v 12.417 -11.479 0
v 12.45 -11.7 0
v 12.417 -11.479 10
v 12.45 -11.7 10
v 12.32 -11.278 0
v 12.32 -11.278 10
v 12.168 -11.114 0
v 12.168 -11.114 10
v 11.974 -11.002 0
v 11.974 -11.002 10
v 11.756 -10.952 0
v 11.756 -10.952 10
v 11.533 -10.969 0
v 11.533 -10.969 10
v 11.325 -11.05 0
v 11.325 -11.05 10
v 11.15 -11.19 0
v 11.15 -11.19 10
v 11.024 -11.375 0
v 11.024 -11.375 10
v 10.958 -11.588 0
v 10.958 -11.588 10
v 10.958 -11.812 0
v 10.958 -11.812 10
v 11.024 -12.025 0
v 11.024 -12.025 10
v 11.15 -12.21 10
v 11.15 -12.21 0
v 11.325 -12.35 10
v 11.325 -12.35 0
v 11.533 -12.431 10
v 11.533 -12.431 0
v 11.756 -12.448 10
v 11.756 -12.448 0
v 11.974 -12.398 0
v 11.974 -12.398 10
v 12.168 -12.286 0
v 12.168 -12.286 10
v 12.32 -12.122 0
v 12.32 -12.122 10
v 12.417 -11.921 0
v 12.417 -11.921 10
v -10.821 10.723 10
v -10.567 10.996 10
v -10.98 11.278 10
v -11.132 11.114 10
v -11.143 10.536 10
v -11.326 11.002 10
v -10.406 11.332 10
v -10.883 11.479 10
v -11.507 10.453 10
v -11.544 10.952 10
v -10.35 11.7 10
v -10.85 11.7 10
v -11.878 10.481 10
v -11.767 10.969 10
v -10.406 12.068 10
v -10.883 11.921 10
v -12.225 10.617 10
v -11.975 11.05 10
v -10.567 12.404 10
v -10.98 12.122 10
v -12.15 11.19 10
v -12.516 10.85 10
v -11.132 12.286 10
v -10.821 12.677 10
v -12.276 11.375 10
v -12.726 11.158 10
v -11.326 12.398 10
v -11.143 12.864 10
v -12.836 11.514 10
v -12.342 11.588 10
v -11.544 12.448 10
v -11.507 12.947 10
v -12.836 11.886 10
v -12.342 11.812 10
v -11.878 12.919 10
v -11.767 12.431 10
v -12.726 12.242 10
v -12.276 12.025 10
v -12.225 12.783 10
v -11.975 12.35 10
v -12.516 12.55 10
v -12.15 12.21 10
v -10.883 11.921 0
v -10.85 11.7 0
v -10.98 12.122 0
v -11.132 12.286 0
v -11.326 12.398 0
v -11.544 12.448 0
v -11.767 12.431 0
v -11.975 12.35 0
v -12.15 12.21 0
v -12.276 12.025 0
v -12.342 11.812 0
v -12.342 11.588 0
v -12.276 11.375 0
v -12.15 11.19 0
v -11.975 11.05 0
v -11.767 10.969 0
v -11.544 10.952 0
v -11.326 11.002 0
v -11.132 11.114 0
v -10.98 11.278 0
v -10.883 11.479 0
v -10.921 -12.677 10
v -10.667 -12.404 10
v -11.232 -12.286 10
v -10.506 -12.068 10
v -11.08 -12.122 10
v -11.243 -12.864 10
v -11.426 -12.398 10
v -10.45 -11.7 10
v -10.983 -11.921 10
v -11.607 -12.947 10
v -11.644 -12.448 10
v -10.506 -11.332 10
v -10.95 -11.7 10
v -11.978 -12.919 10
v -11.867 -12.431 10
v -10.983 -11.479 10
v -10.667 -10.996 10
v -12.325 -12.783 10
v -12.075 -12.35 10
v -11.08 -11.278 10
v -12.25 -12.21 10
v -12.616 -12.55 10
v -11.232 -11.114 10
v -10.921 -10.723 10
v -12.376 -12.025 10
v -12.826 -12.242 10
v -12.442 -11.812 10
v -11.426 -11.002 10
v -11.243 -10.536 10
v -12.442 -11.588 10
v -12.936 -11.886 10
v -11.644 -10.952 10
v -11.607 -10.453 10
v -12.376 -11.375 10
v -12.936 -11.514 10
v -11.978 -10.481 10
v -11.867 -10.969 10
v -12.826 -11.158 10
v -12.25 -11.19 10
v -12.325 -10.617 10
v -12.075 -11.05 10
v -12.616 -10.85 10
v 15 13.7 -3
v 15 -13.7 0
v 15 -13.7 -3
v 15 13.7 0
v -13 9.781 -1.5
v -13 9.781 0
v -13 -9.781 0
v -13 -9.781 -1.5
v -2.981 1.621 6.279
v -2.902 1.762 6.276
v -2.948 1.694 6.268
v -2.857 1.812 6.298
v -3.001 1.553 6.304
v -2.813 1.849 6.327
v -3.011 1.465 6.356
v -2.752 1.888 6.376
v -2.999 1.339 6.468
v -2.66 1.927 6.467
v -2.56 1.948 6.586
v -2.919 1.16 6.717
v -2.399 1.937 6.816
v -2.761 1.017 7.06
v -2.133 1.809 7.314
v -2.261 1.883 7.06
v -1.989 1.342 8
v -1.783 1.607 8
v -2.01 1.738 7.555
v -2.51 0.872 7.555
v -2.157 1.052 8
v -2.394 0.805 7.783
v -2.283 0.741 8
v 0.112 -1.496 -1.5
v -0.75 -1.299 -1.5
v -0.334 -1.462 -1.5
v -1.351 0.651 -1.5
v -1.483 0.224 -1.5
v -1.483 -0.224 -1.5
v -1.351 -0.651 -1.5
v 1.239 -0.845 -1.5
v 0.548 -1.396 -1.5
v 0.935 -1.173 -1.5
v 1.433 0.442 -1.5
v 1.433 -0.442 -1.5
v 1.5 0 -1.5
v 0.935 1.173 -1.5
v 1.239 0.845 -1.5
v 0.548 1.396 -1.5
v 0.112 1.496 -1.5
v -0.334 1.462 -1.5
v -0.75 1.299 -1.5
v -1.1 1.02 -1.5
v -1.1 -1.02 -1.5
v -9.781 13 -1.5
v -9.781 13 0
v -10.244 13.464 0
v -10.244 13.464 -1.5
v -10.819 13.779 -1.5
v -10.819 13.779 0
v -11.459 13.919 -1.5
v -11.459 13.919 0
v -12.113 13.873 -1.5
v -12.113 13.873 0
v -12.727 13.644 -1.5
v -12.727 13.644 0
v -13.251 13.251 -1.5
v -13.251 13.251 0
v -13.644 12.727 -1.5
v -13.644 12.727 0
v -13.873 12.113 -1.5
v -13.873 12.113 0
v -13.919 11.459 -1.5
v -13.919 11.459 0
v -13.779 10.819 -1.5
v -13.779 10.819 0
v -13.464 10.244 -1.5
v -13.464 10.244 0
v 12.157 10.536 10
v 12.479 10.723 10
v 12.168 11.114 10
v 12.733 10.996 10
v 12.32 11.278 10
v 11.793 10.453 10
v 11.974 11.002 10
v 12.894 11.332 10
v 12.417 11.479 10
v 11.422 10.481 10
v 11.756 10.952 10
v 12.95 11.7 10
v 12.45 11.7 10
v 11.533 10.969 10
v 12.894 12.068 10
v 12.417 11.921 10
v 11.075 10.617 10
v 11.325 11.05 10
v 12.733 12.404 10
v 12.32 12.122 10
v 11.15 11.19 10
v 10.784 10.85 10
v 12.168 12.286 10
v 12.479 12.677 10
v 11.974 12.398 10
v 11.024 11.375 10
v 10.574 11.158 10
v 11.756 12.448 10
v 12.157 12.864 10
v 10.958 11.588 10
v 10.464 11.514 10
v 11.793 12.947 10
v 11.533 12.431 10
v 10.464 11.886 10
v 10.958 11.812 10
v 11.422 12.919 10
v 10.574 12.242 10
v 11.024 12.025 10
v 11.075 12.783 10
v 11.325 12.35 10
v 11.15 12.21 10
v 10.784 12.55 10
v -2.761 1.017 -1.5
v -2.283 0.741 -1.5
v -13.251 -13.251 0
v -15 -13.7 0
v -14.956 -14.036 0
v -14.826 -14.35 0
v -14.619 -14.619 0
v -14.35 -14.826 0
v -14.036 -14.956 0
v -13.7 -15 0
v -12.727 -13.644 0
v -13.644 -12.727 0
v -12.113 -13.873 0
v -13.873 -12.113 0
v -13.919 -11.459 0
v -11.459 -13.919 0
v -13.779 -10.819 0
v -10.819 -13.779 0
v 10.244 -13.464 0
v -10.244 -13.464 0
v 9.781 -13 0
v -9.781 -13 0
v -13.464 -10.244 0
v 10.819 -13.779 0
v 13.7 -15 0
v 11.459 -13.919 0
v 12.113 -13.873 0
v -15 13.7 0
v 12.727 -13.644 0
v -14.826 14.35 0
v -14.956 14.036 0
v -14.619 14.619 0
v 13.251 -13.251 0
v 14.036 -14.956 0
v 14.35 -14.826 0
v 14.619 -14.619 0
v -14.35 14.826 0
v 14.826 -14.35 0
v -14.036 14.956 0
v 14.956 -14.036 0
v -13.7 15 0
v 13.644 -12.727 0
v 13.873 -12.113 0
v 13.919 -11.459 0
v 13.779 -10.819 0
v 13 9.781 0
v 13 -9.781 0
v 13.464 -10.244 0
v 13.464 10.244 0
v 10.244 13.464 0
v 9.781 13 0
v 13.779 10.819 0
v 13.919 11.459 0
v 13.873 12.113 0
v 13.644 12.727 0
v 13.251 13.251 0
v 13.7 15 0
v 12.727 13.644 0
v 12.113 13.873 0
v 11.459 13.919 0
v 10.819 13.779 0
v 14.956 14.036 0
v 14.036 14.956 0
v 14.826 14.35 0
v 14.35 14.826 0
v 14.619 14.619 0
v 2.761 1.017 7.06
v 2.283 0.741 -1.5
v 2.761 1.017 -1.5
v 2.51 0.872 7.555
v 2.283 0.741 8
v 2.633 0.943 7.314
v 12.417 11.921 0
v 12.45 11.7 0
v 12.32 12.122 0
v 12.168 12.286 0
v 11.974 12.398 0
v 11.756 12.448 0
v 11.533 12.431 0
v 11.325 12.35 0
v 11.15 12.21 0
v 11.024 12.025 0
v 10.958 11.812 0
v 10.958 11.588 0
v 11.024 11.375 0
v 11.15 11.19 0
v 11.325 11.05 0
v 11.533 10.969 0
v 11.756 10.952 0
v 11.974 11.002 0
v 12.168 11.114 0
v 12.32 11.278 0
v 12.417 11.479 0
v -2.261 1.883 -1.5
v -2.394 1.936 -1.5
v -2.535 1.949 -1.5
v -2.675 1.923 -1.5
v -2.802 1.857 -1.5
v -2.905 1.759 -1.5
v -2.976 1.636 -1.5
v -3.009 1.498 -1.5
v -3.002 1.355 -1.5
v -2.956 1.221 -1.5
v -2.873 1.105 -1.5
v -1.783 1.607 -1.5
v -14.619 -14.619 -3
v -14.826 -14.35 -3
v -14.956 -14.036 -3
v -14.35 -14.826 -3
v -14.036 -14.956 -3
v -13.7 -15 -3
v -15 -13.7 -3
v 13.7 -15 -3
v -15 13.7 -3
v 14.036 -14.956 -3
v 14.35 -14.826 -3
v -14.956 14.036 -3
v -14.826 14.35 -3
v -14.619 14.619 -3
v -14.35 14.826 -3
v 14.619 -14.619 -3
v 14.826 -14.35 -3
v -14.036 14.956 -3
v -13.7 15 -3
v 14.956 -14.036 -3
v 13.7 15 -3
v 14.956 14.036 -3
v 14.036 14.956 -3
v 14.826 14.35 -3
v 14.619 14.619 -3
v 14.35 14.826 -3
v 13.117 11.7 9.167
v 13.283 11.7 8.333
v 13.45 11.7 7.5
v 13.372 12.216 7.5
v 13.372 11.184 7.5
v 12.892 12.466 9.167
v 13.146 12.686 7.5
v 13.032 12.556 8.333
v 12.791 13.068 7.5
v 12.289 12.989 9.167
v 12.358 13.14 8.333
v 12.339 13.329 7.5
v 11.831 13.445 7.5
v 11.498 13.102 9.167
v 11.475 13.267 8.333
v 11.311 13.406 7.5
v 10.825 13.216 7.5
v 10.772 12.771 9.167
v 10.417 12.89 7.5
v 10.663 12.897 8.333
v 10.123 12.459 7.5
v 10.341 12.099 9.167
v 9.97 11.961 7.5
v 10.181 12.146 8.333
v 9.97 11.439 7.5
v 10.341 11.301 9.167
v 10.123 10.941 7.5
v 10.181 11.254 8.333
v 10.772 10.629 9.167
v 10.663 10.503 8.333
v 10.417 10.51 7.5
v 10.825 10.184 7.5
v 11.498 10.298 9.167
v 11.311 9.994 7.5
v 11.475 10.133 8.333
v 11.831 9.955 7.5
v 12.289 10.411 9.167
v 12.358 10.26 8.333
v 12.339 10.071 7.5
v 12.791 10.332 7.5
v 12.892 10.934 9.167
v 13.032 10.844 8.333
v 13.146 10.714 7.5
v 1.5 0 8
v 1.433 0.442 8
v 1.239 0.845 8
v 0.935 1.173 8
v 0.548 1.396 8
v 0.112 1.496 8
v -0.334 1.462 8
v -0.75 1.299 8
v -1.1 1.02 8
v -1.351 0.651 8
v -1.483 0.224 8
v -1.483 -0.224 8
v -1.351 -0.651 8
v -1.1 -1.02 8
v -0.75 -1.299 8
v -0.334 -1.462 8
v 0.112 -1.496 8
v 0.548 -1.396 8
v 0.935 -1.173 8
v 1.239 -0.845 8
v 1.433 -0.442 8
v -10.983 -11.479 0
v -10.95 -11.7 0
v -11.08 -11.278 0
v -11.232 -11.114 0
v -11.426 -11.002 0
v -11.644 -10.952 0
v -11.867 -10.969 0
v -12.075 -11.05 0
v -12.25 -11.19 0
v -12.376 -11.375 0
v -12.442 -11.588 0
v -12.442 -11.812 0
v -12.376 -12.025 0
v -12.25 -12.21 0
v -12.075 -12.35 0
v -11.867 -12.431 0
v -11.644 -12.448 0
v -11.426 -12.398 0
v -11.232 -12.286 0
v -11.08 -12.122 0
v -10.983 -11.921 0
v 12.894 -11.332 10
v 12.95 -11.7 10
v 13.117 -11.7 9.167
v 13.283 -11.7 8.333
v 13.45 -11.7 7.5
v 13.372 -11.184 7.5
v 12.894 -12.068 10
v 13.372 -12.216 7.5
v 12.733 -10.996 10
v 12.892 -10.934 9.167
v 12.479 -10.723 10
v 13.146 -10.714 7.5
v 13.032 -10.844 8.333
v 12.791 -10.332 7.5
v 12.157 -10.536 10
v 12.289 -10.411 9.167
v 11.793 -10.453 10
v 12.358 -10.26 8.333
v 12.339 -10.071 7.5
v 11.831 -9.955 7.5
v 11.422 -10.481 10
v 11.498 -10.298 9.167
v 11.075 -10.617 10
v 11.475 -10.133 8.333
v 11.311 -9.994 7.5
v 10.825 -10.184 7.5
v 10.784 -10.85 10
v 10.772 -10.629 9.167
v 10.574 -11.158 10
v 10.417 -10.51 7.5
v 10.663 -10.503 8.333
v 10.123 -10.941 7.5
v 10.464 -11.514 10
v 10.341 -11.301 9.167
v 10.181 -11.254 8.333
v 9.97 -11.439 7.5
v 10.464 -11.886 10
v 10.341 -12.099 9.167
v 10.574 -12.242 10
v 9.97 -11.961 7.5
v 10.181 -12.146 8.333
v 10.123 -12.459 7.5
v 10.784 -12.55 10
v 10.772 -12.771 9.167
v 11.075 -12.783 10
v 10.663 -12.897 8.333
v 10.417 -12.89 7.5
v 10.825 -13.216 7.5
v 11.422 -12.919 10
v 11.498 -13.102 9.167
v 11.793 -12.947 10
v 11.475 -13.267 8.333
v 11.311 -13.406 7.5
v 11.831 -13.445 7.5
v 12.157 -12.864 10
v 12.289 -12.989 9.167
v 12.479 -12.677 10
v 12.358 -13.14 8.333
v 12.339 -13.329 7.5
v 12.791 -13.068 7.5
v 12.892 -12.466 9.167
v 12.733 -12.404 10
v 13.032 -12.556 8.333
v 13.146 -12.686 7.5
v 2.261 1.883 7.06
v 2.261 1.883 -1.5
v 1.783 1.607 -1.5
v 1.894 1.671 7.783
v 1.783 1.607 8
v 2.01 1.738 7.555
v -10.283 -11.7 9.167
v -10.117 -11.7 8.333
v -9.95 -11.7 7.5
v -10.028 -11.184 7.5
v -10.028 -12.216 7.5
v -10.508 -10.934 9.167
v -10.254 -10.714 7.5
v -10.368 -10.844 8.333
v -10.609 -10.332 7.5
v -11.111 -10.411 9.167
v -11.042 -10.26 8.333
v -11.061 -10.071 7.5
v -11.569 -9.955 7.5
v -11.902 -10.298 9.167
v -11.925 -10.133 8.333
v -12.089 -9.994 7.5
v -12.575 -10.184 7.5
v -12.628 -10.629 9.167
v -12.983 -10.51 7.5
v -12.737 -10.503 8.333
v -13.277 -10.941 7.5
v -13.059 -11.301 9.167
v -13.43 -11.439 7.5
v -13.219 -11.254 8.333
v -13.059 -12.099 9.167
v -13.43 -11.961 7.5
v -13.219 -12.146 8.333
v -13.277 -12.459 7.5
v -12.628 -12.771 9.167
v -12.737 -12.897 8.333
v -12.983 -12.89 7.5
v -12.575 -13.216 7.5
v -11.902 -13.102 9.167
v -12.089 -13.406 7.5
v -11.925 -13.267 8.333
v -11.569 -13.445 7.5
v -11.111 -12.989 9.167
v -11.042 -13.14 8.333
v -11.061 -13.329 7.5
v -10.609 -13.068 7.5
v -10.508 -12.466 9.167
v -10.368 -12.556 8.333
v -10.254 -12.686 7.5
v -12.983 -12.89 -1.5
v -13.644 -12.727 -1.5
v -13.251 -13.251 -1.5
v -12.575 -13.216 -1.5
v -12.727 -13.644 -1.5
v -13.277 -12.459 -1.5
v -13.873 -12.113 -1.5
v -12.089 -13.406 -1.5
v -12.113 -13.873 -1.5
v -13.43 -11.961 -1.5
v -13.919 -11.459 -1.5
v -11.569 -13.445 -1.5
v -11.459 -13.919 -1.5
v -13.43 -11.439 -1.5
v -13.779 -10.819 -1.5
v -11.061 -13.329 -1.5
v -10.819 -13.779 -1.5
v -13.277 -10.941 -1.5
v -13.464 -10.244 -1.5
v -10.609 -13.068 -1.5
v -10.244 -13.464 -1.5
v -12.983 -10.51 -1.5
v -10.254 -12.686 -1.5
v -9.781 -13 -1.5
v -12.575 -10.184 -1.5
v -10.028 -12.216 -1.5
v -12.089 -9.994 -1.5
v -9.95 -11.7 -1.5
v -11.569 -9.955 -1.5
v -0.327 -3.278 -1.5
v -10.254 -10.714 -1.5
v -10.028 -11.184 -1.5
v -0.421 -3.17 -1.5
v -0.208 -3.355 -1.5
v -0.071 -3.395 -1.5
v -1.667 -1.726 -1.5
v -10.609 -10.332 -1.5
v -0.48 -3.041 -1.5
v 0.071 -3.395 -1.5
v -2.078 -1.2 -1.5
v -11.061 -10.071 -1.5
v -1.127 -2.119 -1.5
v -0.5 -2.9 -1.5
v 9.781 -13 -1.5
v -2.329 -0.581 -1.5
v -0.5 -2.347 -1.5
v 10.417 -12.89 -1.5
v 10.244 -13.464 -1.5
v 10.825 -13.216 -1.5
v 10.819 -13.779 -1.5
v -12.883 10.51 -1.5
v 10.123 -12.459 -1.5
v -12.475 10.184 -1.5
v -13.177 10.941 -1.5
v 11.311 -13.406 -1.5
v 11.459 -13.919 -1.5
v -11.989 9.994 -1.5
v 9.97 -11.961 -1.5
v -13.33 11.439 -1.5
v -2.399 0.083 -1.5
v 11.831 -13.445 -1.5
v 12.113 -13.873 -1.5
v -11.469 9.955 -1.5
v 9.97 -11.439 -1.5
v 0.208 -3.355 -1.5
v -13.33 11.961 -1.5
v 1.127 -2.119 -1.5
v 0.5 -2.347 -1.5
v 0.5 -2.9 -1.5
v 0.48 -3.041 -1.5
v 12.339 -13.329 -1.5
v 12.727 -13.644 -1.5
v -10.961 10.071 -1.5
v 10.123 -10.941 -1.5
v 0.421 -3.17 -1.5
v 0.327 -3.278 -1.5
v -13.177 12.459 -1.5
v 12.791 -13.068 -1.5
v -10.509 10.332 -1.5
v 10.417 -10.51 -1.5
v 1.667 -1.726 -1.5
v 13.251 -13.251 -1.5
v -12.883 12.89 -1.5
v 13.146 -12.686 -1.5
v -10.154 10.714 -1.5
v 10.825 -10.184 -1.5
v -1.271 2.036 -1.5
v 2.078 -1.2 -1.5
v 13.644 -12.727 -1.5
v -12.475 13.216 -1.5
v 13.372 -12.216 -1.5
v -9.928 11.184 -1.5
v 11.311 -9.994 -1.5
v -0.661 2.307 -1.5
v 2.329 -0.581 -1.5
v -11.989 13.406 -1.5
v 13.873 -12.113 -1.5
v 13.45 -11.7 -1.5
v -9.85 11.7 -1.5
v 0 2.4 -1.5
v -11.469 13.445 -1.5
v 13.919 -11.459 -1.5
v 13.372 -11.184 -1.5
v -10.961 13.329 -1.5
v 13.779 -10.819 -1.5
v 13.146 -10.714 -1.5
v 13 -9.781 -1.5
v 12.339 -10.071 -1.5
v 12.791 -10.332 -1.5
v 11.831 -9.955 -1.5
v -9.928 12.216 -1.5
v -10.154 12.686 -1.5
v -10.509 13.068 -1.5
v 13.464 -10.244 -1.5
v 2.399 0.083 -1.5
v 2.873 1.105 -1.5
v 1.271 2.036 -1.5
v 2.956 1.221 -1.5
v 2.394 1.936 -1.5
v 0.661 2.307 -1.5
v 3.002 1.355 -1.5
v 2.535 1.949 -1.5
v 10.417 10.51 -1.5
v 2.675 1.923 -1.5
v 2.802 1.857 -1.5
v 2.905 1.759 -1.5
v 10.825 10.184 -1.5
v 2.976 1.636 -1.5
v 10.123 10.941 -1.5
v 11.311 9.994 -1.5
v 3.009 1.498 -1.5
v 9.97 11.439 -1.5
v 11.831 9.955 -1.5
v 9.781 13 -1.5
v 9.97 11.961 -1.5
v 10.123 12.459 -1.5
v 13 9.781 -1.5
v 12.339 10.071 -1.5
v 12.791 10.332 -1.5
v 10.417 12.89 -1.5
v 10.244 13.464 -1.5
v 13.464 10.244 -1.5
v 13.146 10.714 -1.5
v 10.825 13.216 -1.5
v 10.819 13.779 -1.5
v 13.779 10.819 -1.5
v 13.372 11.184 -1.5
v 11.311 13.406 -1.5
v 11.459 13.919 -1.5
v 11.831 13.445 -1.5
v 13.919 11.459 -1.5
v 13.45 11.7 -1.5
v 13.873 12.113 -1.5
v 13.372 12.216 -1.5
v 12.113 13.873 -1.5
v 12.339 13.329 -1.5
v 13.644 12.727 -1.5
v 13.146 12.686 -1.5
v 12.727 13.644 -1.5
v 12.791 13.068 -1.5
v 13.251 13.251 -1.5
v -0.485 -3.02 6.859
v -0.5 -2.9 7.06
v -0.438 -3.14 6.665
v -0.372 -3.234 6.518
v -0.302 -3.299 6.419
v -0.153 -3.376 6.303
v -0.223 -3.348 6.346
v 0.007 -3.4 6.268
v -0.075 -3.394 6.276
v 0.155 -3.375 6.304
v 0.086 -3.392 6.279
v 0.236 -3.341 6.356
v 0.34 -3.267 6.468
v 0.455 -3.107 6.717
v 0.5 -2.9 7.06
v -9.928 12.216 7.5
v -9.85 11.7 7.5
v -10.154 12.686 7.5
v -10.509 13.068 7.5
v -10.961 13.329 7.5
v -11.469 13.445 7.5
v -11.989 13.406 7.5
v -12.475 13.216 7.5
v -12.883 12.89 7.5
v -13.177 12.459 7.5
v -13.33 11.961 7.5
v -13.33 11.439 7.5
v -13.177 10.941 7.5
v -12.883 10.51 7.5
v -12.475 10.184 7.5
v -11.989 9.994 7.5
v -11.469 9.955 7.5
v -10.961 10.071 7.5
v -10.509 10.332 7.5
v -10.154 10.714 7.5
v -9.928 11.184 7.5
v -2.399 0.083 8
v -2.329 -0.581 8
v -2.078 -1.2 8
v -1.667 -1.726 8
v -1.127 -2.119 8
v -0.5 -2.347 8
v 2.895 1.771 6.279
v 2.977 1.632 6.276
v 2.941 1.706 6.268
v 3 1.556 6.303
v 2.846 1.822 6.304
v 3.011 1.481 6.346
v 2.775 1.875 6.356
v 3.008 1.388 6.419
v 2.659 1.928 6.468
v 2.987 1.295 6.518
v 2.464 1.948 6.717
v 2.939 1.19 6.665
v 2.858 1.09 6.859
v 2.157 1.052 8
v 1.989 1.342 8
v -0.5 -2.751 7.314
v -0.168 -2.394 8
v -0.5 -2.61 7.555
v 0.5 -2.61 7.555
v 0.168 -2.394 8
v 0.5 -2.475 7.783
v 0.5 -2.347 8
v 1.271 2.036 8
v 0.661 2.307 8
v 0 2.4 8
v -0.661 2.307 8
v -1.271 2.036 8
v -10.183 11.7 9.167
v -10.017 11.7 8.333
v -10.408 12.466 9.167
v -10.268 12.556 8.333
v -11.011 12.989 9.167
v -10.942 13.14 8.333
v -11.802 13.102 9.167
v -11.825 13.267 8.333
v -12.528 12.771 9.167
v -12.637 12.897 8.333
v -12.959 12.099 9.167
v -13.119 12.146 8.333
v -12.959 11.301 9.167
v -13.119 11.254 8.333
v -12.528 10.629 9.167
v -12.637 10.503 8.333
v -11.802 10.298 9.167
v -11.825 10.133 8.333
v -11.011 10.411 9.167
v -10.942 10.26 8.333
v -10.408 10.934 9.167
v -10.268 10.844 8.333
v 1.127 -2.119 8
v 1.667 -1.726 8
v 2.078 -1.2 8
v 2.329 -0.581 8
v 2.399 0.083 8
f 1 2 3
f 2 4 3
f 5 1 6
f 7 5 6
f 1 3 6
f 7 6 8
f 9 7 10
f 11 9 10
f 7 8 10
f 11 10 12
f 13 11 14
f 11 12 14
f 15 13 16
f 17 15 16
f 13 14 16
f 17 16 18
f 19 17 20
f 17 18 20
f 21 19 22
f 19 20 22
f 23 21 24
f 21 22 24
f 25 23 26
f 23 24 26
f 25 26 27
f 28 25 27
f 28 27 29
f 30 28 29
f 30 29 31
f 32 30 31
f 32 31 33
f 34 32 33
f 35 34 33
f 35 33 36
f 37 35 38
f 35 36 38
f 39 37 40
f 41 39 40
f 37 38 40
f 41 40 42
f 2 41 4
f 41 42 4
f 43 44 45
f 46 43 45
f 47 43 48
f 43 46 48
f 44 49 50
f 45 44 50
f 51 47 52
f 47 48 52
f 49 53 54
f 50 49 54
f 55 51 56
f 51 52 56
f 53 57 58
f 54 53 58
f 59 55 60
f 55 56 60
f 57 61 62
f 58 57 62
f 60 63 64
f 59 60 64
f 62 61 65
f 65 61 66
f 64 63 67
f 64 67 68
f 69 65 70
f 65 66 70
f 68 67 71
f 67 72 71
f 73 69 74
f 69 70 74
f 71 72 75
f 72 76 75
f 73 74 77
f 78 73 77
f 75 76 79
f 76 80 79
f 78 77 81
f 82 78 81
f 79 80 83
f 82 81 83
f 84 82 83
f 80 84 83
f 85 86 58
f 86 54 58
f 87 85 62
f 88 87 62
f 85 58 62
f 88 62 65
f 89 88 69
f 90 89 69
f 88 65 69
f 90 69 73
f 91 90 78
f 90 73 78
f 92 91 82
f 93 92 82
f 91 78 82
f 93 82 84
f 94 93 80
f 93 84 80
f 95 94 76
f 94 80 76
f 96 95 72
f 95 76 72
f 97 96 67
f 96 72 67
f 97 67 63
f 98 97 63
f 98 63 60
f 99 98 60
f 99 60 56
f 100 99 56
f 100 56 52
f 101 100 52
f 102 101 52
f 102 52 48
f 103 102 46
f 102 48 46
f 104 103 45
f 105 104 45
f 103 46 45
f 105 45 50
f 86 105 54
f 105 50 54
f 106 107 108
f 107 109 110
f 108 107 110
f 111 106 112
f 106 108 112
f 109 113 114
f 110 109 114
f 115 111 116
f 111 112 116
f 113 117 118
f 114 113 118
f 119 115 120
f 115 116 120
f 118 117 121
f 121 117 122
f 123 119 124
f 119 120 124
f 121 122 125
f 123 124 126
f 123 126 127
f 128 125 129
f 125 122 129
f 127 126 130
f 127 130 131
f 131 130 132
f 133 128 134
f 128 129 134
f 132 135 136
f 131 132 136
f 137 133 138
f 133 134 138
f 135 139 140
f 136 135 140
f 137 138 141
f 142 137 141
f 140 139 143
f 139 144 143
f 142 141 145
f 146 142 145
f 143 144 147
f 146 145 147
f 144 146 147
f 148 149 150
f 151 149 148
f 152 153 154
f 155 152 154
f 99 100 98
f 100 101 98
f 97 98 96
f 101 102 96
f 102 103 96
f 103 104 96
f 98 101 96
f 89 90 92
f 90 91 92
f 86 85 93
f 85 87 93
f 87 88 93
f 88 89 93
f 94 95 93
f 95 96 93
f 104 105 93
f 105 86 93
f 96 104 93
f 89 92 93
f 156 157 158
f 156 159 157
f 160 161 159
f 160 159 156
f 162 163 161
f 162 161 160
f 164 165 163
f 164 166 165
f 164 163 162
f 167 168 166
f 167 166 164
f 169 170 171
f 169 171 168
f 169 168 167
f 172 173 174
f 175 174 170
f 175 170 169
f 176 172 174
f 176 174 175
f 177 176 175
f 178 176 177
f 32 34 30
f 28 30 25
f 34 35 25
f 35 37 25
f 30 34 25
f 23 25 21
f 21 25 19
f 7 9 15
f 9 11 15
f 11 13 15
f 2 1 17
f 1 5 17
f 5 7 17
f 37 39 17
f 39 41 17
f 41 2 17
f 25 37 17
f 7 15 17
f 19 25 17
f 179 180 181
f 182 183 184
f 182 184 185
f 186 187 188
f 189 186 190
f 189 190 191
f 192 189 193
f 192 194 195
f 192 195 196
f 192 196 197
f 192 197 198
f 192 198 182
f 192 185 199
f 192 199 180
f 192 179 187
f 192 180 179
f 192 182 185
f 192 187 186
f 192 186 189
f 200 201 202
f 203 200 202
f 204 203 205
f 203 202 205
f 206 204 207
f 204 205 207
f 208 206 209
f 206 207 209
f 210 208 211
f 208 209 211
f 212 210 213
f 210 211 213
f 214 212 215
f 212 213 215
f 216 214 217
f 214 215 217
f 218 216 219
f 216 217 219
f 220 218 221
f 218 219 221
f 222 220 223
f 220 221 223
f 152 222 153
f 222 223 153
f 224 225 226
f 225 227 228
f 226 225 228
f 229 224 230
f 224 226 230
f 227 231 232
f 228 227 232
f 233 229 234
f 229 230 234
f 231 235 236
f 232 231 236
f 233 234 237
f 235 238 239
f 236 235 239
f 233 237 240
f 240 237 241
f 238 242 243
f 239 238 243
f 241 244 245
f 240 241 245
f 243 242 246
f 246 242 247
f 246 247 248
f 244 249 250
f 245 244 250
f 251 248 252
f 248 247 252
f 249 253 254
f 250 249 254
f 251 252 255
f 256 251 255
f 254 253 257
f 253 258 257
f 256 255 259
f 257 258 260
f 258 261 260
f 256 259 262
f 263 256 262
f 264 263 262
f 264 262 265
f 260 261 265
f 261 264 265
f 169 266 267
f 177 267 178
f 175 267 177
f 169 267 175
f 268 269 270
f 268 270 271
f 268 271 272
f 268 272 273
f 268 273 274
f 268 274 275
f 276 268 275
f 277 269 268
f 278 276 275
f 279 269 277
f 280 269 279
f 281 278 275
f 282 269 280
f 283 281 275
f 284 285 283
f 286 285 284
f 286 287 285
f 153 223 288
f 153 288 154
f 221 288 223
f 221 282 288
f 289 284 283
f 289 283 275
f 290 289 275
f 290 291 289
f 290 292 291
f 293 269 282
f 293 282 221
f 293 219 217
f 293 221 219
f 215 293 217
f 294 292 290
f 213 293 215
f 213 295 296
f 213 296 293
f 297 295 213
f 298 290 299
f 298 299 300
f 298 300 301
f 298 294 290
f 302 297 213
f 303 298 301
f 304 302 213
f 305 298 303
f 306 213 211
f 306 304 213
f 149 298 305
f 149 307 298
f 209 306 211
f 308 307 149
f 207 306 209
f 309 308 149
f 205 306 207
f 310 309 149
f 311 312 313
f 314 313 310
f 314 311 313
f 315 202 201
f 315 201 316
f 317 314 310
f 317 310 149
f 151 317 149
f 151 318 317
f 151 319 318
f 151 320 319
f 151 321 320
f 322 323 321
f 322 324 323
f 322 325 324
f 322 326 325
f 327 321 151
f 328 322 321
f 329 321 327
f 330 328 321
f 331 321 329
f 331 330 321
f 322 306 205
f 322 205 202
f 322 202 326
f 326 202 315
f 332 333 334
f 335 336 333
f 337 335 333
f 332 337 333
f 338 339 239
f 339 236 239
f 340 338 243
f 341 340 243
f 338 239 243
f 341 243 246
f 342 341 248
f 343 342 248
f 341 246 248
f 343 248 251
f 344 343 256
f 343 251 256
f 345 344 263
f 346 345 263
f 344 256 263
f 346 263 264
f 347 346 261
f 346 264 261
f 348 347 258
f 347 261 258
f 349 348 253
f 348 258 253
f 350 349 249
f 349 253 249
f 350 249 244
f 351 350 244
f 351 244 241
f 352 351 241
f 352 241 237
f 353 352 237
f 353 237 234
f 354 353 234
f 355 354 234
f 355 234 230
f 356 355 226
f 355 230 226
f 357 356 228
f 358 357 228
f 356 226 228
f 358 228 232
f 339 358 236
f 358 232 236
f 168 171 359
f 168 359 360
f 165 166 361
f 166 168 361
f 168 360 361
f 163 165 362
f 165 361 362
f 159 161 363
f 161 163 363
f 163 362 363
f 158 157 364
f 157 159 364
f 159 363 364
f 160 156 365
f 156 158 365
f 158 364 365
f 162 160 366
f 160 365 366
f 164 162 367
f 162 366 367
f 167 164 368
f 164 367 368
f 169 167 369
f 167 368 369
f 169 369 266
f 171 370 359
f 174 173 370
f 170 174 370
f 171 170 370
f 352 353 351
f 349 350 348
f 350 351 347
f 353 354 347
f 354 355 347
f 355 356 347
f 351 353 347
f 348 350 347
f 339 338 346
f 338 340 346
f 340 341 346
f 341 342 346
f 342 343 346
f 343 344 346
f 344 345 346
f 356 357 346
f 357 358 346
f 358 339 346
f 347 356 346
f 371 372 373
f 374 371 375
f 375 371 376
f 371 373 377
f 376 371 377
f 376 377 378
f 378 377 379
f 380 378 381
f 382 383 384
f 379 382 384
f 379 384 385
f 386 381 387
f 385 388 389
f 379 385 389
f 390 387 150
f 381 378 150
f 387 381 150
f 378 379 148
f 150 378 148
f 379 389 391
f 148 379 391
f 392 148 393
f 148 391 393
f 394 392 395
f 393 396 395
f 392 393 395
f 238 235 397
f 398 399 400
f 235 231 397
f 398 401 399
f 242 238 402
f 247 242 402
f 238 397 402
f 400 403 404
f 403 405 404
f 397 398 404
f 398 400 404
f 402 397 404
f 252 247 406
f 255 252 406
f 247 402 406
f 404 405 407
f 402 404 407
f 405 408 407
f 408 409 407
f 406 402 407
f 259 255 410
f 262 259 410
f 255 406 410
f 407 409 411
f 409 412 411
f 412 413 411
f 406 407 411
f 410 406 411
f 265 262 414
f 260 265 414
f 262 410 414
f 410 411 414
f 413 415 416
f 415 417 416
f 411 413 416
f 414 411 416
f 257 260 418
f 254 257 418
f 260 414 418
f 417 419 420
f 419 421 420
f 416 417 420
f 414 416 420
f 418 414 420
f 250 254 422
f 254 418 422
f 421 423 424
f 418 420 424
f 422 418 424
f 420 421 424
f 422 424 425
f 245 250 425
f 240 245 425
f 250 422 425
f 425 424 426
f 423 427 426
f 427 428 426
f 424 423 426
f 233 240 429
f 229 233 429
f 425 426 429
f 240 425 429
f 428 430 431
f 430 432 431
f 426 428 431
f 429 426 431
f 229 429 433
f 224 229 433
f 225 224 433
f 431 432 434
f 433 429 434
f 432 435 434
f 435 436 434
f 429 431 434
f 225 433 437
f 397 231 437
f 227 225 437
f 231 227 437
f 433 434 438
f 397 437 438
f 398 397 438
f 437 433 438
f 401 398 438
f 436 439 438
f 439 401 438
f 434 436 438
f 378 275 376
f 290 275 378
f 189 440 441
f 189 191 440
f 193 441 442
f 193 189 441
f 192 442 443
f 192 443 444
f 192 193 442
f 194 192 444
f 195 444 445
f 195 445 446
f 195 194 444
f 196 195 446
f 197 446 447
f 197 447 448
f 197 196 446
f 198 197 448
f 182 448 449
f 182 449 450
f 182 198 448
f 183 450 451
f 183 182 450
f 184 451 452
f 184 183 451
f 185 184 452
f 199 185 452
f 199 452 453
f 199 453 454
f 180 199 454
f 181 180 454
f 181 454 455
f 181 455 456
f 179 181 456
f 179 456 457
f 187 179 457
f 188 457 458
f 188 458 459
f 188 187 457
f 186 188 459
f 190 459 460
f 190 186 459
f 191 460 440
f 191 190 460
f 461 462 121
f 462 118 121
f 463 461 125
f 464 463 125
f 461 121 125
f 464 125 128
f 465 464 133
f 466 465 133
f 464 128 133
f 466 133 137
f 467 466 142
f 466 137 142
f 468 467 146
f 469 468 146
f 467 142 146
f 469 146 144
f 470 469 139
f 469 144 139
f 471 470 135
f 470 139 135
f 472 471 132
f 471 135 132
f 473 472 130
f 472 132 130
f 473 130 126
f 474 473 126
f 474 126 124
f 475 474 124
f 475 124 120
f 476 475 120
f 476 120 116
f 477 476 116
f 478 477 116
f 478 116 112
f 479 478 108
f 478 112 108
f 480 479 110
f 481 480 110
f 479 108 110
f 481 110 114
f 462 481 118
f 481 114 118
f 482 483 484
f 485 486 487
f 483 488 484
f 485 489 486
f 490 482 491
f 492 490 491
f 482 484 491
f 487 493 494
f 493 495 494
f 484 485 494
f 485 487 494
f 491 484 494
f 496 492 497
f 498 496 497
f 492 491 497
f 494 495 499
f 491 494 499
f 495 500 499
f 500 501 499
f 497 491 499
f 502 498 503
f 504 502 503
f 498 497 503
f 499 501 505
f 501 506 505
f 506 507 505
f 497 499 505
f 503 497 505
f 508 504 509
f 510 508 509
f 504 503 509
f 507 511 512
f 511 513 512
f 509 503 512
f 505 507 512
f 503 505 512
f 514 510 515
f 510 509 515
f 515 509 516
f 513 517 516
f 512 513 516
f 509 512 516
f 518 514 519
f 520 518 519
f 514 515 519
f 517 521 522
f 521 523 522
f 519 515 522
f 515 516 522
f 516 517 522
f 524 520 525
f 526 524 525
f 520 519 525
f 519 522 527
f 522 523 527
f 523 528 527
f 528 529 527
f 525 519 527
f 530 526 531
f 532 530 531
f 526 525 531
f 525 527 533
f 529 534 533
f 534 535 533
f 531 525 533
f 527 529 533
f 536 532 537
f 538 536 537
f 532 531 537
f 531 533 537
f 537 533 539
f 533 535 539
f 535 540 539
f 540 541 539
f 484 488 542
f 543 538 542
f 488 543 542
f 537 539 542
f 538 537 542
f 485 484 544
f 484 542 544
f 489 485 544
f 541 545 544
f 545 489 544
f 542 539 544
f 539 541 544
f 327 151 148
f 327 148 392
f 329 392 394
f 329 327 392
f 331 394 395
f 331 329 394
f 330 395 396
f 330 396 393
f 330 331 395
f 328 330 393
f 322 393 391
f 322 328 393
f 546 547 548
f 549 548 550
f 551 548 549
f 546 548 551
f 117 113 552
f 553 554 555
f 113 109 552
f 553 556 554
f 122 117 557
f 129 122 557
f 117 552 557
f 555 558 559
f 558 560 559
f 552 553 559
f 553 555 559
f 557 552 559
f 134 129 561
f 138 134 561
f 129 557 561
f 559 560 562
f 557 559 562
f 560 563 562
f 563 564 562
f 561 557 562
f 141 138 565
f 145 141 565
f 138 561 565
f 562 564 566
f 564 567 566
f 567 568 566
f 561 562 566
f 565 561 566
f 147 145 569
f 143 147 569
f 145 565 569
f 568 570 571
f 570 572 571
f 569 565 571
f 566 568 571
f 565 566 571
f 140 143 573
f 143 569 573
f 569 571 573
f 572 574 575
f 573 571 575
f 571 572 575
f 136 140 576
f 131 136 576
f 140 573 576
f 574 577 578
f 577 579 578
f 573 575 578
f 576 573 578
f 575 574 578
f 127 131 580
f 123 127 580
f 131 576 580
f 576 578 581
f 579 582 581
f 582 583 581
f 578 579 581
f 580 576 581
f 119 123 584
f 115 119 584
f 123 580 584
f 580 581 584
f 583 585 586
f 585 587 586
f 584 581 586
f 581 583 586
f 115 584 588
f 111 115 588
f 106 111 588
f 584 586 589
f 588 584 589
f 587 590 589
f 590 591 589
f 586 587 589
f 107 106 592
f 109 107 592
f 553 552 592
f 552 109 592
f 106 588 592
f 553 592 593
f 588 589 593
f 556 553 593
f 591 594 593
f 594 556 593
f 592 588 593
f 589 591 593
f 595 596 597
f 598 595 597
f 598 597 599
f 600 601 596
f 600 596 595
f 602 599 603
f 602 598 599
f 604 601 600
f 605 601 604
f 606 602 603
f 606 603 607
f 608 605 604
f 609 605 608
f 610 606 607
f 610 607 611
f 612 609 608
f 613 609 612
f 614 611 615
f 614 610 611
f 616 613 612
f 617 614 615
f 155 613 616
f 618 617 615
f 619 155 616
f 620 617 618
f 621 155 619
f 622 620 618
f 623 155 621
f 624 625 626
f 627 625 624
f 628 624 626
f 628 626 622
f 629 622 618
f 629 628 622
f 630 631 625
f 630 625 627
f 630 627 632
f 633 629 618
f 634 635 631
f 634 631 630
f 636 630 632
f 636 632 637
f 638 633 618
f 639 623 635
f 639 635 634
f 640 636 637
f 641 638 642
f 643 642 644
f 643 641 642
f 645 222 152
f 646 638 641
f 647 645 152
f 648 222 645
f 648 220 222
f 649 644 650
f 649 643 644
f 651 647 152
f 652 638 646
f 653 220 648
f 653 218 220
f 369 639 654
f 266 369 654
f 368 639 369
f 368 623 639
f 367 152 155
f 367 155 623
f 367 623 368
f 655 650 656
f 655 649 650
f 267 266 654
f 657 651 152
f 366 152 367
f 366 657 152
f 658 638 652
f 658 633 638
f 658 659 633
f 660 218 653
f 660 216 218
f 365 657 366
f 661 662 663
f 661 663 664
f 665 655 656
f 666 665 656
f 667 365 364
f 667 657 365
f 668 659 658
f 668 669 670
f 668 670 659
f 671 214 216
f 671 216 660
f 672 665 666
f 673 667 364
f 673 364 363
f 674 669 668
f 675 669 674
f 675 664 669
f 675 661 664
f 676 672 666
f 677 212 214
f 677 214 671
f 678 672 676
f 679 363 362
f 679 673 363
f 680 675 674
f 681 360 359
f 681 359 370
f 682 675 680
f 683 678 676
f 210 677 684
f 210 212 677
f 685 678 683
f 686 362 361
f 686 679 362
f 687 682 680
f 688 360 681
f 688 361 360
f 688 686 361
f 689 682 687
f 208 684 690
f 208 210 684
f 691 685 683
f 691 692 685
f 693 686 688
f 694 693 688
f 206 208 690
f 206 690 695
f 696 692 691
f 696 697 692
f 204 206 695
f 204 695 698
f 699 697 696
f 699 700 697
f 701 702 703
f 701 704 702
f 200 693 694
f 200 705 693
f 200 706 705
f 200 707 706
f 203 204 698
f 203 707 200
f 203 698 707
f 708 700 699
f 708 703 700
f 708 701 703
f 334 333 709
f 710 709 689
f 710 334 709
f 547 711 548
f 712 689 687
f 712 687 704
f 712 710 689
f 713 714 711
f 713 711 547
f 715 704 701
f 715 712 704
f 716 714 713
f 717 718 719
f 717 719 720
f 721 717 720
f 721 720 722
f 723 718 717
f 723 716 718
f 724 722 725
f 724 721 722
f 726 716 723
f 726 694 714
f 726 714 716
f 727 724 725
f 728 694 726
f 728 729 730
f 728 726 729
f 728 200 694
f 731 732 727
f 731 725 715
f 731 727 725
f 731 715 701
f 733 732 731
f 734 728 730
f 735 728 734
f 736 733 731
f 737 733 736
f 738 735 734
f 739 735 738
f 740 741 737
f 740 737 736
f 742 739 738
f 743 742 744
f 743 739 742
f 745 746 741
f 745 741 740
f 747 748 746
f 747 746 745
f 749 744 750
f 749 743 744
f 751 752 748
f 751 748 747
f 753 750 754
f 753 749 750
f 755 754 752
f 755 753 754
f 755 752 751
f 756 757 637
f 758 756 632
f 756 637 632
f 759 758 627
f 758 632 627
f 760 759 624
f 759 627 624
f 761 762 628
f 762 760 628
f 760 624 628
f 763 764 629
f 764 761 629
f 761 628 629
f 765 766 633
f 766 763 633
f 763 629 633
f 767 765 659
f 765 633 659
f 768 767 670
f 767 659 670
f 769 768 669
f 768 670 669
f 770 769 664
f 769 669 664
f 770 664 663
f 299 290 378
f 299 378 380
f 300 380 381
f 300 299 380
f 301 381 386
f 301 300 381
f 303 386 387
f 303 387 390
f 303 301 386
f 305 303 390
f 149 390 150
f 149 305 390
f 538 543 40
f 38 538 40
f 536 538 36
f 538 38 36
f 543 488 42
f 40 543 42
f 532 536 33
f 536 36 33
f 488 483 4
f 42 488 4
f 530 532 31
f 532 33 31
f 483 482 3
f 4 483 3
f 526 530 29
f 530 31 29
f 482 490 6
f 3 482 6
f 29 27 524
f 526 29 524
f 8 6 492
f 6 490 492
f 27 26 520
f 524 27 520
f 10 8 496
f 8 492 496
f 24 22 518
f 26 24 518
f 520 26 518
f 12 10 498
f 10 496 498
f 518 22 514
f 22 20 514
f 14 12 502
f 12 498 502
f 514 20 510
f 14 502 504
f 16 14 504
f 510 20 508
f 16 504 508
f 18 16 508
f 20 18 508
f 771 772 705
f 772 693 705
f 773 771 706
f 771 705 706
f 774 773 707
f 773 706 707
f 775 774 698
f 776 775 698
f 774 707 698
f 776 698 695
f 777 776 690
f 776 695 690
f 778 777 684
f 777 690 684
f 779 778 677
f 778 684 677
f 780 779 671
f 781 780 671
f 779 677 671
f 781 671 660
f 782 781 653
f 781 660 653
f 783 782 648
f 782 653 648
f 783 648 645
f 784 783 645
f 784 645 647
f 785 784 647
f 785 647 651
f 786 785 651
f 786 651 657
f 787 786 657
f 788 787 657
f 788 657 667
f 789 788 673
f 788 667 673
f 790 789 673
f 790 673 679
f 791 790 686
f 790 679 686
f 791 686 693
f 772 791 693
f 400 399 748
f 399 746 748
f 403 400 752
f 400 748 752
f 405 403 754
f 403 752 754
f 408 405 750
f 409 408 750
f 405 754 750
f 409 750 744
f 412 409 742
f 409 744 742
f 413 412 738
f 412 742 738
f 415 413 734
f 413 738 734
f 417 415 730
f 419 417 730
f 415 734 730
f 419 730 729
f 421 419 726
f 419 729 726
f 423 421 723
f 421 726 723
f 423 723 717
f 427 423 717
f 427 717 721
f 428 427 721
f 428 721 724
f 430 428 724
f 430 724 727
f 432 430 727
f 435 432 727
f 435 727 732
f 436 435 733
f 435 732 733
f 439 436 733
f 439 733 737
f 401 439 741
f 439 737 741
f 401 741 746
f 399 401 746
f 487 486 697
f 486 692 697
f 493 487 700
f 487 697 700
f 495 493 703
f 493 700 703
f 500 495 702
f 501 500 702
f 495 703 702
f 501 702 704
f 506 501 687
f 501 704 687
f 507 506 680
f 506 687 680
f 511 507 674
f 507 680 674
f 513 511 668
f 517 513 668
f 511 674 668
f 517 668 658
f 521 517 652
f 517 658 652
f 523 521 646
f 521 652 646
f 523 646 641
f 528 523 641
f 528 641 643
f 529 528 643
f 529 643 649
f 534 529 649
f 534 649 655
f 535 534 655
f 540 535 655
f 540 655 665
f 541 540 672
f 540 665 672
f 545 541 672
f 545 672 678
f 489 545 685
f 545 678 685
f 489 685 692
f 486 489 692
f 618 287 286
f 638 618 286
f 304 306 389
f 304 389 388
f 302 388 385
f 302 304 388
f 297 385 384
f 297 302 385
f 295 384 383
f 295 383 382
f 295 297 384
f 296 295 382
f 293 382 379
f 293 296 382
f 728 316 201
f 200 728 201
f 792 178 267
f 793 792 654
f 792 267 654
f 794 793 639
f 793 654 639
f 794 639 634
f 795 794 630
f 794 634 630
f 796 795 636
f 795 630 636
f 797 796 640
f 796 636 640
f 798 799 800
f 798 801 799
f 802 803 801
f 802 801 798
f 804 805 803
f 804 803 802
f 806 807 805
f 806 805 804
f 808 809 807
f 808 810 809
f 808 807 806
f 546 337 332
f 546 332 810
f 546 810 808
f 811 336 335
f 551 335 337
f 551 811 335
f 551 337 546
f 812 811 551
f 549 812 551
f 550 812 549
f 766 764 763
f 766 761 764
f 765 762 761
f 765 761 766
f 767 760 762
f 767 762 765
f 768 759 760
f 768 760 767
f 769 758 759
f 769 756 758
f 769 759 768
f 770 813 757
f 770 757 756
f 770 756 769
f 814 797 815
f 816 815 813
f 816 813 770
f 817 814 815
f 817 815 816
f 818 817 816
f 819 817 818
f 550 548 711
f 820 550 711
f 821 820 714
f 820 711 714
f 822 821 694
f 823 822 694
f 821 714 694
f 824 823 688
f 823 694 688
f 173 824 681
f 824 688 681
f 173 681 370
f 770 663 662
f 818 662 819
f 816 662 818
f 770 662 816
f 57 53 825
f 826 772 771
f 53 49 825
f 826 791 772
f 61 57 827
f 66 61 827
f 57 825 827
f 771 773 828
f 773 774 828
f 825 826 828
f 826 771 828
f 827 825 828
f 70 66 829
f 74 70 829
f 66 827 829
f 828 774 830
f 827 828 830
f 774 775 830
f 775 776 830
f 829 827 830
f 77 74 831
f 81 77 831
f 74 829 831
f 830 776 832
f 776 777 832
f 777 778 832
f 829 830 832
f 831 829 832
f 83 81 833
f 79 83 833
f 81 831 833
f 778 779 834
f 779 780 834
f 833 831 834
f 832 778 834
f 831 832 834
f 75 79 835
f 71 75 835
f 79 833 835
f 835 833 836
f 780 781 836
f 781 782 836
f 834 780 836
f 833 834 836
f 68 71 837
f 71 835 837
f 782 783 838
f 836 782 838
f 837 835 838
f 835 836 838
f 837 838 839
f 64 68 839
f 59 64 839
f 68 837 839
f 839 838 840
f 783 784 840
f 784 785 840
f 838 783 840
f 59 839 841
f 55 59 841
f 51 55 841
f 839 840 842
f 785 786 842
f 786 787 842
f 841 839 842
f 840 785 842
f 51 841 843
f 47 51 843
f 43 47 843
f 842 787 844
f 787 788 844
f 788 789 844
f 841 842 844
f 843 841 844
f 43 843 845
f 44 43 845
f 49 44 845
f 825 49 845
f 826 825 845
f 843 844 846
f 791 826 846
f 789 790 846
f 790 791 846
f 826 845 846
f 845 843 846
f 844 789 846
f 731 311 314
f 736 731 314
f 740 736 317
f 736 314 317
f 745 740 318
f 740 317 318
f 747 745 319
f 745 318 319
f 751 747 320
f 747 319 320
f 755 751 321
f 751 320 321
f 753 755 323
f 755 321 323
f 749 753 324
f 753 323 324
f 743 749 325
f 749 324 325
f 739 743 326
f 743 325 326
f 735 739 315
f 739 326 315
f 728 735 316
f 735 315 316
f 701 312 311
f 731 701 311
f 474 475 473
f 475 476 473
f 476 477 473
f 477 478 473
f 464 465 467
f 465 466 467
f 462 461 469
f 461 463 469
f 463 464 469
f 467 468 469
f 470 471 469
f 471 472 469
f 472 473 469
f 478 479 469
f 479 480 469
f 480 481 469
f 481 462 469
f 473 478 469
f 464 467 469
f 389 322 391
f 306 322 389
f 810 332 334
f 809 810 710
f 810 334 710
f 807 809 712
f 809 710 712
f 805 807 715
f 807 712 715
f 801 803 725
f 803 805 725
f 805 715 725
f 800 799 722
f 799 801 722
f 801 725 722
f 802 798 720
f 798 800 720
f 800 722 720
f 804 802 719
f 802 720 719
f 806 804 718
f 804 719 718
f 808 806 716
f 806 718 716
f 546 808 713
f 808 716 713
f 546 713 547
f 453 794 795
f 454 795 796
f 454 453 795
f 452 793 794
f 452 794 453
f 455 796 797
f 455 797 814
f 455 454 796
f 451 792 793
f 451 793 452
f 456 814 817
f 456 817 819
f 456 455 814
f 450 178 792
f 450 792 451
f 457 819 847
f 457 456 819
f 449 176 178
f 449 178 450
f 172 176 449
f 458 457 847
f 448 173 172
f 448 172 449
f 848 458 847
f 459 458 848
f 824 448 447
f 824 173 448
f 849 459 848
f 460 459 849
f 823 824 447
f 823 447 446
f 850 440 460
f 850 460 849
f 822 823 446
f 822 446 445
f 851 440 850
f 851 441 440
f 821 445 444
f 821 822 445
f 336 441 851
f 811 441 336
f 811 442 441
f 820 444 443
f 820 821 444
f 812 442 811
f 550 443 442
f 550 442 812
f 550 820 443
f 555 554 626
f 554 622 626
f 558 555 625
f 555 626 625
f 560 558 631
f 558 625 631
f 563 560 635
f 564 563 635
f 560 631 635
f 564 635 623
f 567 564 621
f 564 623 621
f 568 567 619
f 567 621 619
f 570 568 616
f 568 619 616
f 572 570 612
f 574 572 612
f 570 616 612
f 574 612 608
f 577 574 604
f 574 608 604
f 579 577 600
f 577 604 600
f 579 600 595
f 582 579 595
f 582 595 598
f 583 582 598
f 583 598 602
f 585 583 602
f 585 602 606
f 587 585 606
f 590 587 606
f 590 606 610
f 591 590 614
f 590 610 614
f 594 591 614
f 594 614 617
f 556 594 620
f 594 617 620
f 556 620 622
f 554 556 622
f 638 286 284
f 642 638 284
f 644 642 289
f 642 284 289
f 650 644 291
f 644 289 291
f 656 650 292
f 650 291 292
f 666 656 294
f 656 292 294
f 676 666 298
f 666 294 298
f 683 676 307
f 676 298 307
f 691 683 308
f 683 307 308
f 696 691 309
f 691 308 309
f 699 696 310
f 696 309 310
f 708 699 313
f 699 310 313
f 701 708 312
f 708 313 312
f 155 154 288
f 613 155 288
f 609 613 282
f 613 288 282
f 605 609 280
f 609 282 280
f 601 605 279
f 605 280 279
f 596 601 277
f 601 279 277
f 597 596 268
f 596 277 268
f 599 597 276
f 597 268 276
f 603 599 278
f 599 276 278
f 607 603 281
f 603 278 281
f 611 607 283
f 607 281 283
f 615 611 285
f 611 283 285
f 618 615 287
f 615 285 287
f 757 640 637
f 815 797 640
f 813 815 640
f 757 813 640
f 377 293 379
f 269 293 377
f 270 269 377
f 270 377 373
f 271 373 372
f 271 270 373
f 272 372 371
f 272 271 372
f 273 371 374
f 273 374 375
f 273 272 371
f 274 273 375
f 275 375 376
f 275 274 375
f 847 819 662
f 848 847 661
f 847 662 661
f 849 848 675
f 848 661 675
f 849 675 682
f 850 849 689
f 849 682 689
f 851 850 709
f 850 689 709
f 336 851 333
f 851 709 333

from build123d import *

# Parameters (mm, degrees)
BOSS_EXTRUDE1_DEPTH = 3
CUT_EXTRUDE1_DEPTH  = 1.5
SKETCH8_R           = 6
CUT_EXTRUDE2_DEPTH  = 10


with BuildPart() as part:
    # Sketch1 → Boss-Extrude1 (new body)
    with BuildSketch(Plane.XY):
        with BuildLine():
            Line((-15, 13.7), (-15, -13.7))
            ThreePointArc((-15, -13.7), (-14.619238816, -14.619238816), (-13.7, -15))
            Line((-13.7, -15), (13.7, -15))
            ThreePointArc((13.7, -15), (14.619238816, -14.619238816), (15, -13.7))
            Line((15, -13.7), (15, 13.7))
            ThreePointArc((15, 13.7), (14.619238816, 14.619238816), (13.7, 15))
            Line((13.7, 15), (-13.7, 15))
            ThreePointArc((-13.7, 15), (-14.619238816, 14.619238816), (-15, 13.7))
        make_face()
    extrude(amount=-BOSS_EXTRUDE1_DEPTH)

    # Sketch2 → Cut-Extrude1 (cut)
    with BuildSketch(Plane.XY):
        with BuildLine():
            Line((-13, 9.781260593), (-13, -9.781260593))
            ThreePointArc((-13, -9.781260593), (-13.251345597, -13.251345597), (-9.781260593, -13))
            Line((-9.781260593, -13), (9.781260593, -13))
            ThreePointArc((9.781260593, -13), (13.251345597, -13.251345597), (13, -9.781260593))
            Line((13, -9.781260593), (13, 9.781260593))
            ThreePointArc((13, 9.781260593), (13.251345597, 13.251345597), (9.781260593, 13))
            Line((9.781260593, 13), (-9.781260593, 13))
            ThreePointArc((-9.781260593, 13), (-13.251345597, 13.251345597), (-13, 9.781260593))
        make_face()
    extrude(amount=-CUT_EXTRUDE1_DEPTH, mode=Mode.SUBTRACT)

    # Sketch3 → Revolve1 (revolve)
    with BuildSketch(Plane(origin=(-11.6, 0, 0), x_dir=(0, 0, -1), z_dir=(1, 0, 0)), mode=Mode.PRIVATE) as revolve1_sk:
        Polygon((0, 11.7), (0, 12.45), (-10, 12.45), (-10, 12.95), (-7.5, 13.45), (1.5, 13.45), (1.5, 11.7), align=None)
    revolve(revolve1_sk.sketch.rotate(Axis((-11.6, 11.7, -1.5), (0, 0, 1)), 270), axis=Axis((-11.6, 11.7, -1.5), (0, 0, 1)))

    # Sketch4 → Revolve2 (revolve)
    with BuildSketch(Plane(origin=(11.7, 0, 0), x_dir=(0, 0, -1), z_dir=(1, 0, 0)), mode=Mode.PRIVATE) as revolve2_sk:
        Polygon((0, 11.7), (0, 12.45), (-10, 12.45), (-10, 12.95), (-7.5, 13.45), (1.5, 13.45), (1.5, 11.7), align=None)
    revolve(revolve2_sk.sketch.rotate(Axis((11.7, 11.7, -1.5), (0, 0, 1)), 270), axis=Axis((11.7, 11.7, -1.5), (0, 0, 1)))

    # Sketch5 → Revolve3 (revolve)
    with BuildSketch(Plane(origin=(11.7, 0, 0), x_dir=(0, 0, -1), z_dir=(1, 0, 0)), mode=Mode.PRIVATE) as revolve3_sk:
        Polygon((0, -11.7), (0, -10.95), (-10, -10.95), (-10, -10.45), (-7.5, -9.95), (1.5, -9.95), (1.5, -11.7), align=None)
    revolve(revolve3_sk.sketch.rotate(Axis((11.7, -11.7, -1.5), (0, 0, 1)), 270), axis=Axis((11.7, -11.7, -1.5), (0, 0, 1)))

    # Sketch6 → Revolve4 (revolve)
    with BuildSketch(Plane(origin=(-11.7, 0, 0), x_dir=(0, 0, -1), z_dir=(1, 0, 0)), mode=Mode.PRIVATE) as revolve4_sk:
        Polygon((0, -11.7), (0, -10.95), (-10, -10.95), (-10, -10.45), (-7.5, -9.95), (1.5, -9.95), (1.5, -11.7), align=None)
    revolve(revolve4_sk.sketch.rotate(Axis((-11.7, -11.7, -1.5), (0, 0, 1)), 270), axis=Axis((-11.7, -11.7, -1.5), (0, 0, 1)))

    # Sketch7 → Revolve5 (revolve)
    with BuildSketch(Plane(origin=(0, 0, 0), x_dir=(0, 0, -1), z_dir=(1, 0, 0)), mode=Mode.PRIVATE) as revolve5_sk:
        Polygon((-8, 1.5), (1.5, 1.5), (1.5, 3.4), (-6.267949192, 3.4), (-8, 2.4), align=None)
    revolve(revolve5_sk.sketch.rotate(Axis((0, 0, -10), (0, 0, 1)), 270), axis=Axis((0, 0, -10), (0, 0, 1)))

    # Sketch8 → Cut-Extrude2 (cut)
    with BuildSketch(Plane.XY.offset(-1.5)):
        Circle(SKETCH8_R)
        with BuildLine():
            Line((-2.761473671, 1.016987298), (-2.282855135, 0.740656758))
            ThreePointArc((-2.282855135, 0.740656758), (-2.078460969, -1.2), (-0.5, -2.347338919))
            Line((-0.5, -2.347338919), (-0.5, -2.9))
            ThreePointArc((-0.5, -2.9), (0, -3.4), (0.5, -2.9))
            Line((0.5, -2.9), (0.5, -2.347338919))
            ThreePointArc((0.5, -2.347338919), (2.078460969, -1.2), (2.282855135, 0.740656758))
            Line((2.282855135, 0.740656758), (2.761473671, 1.016987298))
            ThreePointArc((2.761473671, 1.016987298), (2.944486373, 1.7), (2.261473671, 1.883012702))
            Line((2.261473671, 1.883012702), (1.782855135, 1.606682161))
            ThreePointArc((1.782855135, 1.606682161), (0, 2.4), (-1.782855135, 1.606682161))
            Line((-1.782855135, 1.606682161), (-2.261473671, 1.883012702))
            ThreePointArc((-2.261473671, 1.883012702), (-2.944486373, 1.7), (-2.761473671, 1.016987298))
        make_face(mode=Mode.SUBTRACT)
    extrude(amount=CUT_EXTRUDE2_DEPTH, mode=Mode.SUBTRACT)


solid = part.part
